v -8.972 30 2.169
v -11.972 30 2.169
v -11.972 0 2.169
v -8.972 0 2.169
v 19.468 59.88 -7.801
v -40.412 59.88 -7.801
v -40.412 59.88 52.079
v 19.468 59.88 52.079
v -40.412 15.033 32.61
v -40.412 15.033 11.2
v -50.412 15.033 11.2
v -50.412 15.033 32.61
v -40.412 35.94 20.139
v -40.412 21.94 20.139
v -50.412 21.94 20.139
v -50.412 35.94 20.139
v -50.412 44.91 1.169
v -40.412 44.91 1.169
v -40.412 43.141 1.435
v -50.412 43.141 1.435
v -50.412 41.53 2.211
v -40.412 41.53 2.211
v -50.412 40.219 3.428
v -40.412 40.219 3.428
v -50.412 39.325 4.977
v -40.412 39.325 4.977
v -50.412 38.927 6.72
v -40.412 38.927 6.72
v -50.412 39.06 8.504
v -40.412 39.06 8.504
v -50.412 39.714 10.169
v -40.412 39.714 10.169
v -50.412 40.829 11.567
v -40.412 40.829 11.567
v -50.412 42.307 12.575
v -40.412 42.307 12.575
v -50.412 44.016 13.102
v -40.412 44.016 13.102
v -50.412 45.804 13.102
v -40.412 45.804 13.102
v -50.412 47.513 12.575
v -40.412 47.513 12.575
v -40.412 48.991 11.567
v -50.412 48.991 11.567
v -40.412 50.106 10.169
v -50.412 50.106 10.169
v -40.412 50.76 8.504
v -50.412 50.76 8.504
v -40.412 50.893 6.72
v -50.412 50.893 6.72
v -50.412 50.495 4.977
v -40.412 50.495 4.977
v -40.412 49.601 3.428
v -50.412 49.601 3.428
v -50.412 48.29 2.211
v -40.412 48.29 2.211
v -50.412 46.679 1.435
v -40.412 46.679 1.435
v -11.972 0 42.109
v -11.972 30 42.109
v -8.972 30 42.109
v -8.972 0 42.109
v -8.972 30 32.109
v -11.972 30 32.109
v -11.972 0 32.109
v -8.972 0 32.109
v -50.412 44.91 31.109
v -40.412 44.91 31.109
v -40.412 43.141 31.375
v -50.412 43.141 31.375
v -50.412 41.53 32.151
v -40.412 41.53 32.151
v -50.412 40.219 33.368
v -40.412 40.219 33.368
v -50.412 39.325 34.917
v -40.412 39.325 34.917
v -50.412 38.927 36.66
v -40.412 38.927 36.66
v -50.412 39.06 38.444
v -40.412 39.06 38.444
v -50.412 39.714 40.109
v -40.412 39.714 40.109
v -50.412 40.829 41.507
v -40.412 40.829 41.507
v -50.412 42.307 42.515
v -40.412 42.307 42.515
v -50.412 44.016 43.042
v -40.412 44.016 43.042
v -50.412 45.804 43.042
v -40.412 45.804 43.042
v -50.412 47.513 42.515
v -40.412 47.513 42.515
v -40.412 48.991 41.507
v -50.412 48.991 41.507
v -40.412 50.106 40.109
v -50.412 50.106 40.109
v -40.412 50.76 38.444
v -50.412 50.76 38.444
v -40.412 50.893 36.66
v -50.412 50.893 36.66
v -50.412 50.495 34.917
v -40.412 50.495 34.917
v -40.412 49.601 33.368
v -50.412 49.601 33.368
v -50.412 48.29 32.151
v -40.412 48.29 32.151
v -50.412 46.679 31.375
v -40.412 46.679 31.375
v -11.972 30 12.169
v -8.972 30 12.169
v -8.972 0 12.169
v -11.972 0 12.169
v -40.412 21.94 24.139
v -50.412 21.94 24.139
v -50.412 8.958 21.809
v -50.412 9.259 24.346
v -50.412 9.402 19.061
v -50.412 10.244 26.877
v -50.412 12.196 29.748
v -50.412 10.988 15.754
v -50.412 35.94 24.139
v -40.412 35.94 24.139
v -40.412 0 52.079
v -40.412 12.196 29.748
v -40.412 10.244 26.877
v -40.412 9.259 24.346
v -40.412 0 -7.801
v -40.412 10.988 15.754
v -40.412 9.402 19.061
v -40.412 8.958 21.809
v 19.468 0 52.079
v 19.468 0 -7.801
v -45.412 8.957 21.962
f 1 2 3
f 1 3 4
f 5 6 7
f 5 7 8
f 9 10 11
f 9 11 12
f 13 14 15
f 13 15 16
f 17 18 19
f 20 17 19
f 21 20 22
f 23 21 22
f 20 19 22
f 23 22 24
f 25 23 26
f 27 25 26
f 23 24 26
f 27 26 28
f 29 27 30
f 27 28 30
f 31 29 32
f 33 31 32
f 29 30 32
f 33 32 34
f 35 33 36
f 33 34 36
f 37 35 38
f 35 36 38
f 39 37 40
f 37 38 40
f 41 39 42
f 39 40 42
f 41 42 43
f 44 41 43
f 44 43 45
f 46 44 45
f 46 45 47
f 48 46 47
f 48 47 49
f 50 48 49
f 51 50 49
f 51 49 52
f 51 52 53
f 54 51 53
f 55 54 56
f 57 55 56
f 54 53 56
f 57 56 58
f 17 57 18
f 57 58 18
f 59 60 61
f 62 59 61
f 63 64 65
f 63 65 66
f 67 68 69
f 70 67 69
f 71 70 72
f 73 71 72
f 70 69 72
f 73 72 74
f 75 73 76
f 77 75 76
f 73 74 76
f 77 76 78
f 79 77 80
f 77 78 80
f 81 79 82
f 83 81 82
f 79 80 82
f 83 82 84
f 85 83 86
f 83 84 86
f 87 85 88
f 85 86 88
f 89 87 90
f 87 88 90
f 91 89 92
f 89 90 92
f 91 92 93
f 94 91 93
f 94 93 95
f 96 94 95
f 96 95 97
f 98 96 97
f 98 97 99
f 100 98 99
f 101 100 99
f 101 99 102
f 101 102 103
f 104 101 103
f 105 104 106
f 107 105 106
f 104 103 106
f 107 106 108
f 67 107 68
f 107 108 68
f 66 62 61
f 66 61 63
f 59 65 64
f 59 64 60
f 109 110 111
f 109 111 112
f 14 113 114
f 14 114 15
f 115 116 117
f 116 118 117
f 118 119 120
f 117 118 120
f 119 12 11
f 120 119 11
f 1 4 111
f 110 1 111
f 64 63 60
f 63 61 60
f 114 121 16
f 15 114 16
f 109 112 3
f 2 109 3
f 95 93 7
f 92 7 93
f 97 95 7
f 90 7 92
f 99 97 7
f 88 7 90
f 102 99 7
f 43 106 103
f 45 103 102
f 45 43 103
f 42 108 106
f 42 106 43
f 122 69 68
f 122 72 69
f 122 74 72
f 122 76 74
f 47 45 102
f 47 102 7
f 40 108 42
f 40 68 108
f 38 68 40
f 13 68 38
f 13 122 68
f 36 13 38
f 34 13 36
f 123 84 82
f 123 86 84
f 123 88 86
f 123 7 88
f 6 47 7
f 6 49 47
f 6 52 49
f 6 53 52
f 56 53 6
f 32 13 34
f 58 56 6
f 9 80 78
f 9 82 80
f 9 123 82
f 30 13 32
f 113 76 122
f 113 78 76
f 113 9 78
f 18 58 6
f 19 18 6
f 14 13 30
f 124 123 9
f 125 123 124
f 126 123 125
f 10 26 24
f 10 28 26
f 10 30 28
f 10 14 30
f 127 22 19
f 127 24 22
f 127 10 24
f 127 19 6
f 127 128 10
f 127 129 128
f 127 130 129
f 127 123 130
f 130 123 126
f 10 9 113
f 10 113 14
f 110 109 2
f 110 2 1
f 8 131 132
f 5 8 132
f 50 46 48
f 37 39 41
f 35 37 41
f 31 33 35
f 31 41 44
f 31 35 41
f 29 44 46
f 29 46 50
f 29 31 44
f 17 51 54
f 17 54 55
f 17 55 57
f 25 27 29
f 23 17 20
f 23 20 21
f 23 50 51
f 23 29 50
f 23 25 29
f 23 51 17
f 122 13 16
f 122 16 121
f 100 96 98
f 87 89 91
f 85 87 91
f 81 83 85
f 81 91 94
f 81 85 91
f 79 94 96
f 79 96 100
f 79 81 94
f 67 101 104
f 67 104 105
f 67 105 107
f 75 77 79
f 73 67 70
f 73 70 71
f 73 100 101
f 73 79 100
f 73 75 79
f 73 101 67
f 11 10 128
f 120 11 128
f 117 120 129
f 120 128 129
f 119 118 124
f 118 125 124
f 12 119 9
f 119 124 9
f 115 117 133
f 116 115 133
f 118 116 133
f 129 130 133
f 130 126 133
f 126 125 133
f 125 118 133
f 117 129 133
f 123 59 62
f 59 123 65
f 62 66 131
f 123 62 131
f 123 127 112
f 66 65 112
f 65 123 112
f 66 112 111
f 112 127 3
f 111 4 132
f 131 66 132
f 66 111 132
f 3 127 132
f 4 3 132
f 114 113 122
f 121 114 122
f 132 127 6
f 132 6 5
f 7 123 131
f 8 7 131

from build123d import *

# Parameters (mm, degrees)
SKETCH1_W           = 59.88
SKETCH1_H           = 59.88
BOSS_EXTRUDE1_DEPTH = 59.88
CUT_EXTRUDE1_DEPTH  = 30
SKETCH4_R           = 6
BOSS_EXTRUDE3_DEPTH = 10
BOSS_EXTRUDE4_DEPTH = 10


with BuildPart() as part:
    # Sketch1 → Boss-Extrude1 (new body)
    with BuildSketch(Plane(origin=(0, 0, 0), x_dir=(1, 0, 0), z_dir=(0, 1, 0))):
        with Locations((-10.472375433, -22.138876894)):
            Rectangle(SKETCH1_W, SKETCH1_H)
    extrude(amount=BOSS_EXTRUDE1_DEPTH)

    # Sketch2 → Cut-Extrude1 (cut)
    with BuildSketch(Plane.XZ):
        Polygon((-10.472375433, 2.168876894), (-10.472375433, 7.168876894), (-10.472375433, 12.168876894), (-11.972375433, 12.168876894), (-11.972375433, 2.168876894), align=None)
        Polygon((-10.472375433, 12.168876894), (-10.472375433, 7.168876894), (-10.472375433, 2.168876894), (-8.972375433, 2.168876894), (-8.972375433, 12.168876894), align=None)
        Polygon((-8.972375433, 32.108876894), (-10.472375433, 32.108876894), (-11.972375433, 32.108876894), (-11.972375433, 42.108876894), (-8.972375433, 42.108876894), align=None)
    extrude(amount=-CUT_EXTRUDE1_DEPTH, mode=Mode.SUBTRACT)

    # Sketch4 → Boss-Extrude3 (add)
    with BuildSketch(Plane.ZY.offset(40.412375433)):
        with Locations(Location((7.168876894, 44.91, 0), (0, 0, 180))):
            Circle(SKETCH4_R)
        with Locations(Location((37.108876894, 44.91, 0), (0, 0, 180))):
            Circle(SKETCH4_R)
    extrude(amount=BOSS_EXTRUDE3_DEPTH)

    # Sketch5 → Boss-Extrude4 (add)
    with BuildSketch(Plane.ZY.offset(40.412375433)):
        Polygon((20.138876894, 21.94), (20.138876894, 35.94), (24.138876894, 35.94), (24.138876894, 29.94), (24.138876894, 21.94), align=None)
        with BuildLine():
            Line((11.199558119, 15.032847323), (32.61038324, 15.032847323))
            add(Edge.make_bspline(
                [(11.199558119, 15.032847323), (22.018966273, 2.880785428), (32.61038324, 15.032847323)],
                knots=[0, 0, 0, 1, 1, 1], degree=2))
        make_face()
    extrude(amount=BOSS_EXTRUDE4_DEPTH)


solid = part.part
